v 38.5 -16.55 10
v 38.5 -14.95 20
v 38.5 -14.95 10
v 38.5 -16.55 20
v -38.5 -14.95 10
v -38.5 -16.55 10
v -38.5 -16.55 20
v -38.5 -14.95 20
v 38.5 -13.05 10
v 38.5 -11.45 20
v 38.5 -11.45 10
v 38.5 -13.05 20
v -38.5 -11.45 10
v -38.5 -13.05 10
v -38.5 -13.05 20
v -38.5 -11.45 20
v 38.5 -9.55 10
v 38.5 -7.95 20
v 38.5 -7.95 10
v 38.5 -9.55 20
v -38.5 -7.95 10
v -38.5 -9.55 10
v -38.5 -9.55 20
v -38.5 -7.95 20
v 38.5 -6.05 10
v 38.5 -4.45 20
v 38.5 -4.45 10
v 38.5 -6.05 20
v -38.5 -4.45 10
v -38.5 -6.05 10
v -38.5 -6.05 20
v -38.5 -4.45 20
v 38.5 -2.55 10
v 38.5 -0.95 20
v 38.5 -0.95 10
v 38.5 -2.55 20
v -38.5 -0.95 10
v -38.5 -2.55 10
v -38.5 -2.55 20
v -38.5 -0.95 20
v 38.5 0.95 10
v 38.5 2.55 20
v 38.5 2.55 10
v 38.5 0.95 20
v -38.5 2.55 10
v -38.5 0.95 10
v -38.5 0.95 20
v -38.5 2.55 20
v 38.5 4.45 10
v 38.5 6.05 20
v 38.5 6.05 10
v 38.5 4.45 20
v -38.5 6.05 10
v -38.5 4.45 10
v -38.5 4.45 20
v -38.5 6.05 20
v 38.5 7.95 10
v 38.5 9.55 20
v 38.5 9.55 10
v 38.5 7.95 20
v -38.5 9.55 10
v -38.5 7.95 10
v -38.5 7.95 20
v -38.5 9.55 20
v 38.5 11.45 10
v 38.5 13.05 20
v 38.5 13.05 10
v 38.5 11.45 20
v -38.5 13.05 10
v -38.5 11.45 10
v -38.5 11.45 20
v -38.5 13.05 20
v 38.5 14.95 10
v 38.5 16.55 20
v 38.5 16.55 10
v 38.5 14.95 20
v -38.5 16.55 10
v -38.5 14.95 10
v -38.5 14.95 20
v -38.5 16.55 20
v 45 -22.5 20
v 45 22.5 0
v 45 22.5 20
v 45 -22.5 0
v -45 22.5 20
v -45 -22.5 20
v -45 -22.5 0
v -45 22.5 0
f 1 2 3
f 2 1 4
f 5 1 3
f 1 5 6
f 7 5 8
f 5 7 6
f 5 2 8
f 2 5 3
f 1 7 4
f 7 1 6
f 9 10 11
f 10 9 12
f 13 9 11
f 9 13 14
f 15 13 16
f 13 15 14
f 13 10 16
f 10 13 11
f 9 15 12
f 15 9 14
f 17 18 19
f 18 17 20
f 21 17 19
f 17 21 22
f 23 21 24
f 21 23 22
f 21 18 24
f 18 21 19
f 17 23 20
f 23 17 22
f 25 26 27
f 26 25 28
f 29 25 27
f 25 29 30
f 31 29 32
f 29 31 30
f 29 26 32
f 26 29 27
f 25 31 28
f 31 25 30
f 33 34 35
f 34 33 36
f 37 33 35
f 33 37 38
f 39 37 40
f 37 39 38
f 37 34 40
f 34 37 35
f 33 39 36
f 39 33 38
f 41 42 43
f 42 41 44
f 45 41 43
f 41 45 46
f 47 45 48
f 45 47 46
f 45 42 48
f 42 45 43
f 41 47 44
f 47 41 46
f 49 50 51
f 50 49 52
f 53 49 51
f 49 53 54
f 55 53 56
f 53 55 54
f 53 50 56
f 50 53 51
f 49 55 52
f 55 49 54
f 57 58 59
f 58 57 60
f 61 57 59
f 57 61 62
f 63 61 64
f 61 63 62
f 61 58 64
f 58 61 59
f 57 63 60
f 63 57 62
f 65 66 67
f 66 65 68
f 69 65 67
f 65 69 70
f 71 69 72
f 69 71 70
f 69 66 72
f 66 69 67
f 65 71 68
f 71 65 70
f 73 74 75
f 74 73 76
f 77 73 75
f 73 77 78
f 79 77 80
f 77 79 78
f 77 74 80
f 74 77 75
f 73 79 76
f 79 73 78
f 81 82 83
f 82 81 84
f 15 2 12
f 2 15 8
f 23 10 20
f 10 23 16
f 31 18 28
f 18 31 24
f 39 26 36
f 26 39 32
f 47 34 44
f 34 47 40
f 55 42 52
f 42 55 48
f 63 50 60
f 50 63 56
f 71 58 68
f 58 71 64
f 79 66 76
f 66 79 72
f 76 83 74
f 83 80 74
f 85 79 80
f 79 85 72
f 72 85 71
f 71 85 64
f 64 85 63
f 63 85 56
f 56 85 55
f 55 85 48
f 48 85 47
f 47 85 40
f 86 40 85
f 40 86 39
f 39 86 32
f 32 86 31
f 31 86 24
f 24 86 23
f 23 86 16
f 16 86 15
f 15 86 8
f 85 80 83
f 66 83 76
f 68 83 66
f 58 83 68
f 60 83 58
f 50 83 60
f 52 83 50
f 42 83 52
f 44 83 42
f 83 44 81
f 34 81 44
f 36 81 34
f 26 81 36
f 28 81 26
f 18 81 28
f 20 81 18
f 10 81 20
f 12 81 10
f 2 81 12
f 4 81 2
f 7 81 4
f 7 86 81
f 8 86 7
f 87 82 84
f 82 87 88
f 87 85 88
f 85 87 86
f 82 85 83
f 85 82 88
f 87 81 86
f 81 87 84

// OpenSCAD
// Sliding rack for 10 microscope slides (75 x 25 x 1 mm)
// Print orientation: base block on XY plane, slots open upward (+Z)

// ---------------- Parameters ----------------
n_slots      = 10;    // number of slide slots
slot_len     = 77;    // slot length along X (mm)
slot_w       = 1.6;   // slot width along Y (mm)
slot_depth   = 10;    // slot depth from top face (mm)
slot_pitch   = 3.5;   // centre-to-centre spacing along Y (mm)
block_len    = 90;    // base block length along X (mm)
block_w      = 45;    // base block width along Y (mm)
block_h      = 20;    // base block height along Z (mm)
eps          = 0.5;   // overcut past faces to avoid coplanar faces (mm)

$fn = 64;

// ---------------- Model ----------------
difference() {
    // Base block, centred in X and Y, resting on z = 0
    translate([-block_len / 2, -block_w / 2, 0])
        cube([block_len, block_w, block_h]);

    // Parallel slot group, centred on the block in X and Y
    for (i = [0 : n_slots - 1]) {
        y = (i - (n_slots - 1) / 2) * slot_pitch;
        translate([-slot_len / 2, y - slot_w / 2, block_h - slot_depth])
            cube([slot_len, slot_w, slot_depth + eps]);
    }
}
